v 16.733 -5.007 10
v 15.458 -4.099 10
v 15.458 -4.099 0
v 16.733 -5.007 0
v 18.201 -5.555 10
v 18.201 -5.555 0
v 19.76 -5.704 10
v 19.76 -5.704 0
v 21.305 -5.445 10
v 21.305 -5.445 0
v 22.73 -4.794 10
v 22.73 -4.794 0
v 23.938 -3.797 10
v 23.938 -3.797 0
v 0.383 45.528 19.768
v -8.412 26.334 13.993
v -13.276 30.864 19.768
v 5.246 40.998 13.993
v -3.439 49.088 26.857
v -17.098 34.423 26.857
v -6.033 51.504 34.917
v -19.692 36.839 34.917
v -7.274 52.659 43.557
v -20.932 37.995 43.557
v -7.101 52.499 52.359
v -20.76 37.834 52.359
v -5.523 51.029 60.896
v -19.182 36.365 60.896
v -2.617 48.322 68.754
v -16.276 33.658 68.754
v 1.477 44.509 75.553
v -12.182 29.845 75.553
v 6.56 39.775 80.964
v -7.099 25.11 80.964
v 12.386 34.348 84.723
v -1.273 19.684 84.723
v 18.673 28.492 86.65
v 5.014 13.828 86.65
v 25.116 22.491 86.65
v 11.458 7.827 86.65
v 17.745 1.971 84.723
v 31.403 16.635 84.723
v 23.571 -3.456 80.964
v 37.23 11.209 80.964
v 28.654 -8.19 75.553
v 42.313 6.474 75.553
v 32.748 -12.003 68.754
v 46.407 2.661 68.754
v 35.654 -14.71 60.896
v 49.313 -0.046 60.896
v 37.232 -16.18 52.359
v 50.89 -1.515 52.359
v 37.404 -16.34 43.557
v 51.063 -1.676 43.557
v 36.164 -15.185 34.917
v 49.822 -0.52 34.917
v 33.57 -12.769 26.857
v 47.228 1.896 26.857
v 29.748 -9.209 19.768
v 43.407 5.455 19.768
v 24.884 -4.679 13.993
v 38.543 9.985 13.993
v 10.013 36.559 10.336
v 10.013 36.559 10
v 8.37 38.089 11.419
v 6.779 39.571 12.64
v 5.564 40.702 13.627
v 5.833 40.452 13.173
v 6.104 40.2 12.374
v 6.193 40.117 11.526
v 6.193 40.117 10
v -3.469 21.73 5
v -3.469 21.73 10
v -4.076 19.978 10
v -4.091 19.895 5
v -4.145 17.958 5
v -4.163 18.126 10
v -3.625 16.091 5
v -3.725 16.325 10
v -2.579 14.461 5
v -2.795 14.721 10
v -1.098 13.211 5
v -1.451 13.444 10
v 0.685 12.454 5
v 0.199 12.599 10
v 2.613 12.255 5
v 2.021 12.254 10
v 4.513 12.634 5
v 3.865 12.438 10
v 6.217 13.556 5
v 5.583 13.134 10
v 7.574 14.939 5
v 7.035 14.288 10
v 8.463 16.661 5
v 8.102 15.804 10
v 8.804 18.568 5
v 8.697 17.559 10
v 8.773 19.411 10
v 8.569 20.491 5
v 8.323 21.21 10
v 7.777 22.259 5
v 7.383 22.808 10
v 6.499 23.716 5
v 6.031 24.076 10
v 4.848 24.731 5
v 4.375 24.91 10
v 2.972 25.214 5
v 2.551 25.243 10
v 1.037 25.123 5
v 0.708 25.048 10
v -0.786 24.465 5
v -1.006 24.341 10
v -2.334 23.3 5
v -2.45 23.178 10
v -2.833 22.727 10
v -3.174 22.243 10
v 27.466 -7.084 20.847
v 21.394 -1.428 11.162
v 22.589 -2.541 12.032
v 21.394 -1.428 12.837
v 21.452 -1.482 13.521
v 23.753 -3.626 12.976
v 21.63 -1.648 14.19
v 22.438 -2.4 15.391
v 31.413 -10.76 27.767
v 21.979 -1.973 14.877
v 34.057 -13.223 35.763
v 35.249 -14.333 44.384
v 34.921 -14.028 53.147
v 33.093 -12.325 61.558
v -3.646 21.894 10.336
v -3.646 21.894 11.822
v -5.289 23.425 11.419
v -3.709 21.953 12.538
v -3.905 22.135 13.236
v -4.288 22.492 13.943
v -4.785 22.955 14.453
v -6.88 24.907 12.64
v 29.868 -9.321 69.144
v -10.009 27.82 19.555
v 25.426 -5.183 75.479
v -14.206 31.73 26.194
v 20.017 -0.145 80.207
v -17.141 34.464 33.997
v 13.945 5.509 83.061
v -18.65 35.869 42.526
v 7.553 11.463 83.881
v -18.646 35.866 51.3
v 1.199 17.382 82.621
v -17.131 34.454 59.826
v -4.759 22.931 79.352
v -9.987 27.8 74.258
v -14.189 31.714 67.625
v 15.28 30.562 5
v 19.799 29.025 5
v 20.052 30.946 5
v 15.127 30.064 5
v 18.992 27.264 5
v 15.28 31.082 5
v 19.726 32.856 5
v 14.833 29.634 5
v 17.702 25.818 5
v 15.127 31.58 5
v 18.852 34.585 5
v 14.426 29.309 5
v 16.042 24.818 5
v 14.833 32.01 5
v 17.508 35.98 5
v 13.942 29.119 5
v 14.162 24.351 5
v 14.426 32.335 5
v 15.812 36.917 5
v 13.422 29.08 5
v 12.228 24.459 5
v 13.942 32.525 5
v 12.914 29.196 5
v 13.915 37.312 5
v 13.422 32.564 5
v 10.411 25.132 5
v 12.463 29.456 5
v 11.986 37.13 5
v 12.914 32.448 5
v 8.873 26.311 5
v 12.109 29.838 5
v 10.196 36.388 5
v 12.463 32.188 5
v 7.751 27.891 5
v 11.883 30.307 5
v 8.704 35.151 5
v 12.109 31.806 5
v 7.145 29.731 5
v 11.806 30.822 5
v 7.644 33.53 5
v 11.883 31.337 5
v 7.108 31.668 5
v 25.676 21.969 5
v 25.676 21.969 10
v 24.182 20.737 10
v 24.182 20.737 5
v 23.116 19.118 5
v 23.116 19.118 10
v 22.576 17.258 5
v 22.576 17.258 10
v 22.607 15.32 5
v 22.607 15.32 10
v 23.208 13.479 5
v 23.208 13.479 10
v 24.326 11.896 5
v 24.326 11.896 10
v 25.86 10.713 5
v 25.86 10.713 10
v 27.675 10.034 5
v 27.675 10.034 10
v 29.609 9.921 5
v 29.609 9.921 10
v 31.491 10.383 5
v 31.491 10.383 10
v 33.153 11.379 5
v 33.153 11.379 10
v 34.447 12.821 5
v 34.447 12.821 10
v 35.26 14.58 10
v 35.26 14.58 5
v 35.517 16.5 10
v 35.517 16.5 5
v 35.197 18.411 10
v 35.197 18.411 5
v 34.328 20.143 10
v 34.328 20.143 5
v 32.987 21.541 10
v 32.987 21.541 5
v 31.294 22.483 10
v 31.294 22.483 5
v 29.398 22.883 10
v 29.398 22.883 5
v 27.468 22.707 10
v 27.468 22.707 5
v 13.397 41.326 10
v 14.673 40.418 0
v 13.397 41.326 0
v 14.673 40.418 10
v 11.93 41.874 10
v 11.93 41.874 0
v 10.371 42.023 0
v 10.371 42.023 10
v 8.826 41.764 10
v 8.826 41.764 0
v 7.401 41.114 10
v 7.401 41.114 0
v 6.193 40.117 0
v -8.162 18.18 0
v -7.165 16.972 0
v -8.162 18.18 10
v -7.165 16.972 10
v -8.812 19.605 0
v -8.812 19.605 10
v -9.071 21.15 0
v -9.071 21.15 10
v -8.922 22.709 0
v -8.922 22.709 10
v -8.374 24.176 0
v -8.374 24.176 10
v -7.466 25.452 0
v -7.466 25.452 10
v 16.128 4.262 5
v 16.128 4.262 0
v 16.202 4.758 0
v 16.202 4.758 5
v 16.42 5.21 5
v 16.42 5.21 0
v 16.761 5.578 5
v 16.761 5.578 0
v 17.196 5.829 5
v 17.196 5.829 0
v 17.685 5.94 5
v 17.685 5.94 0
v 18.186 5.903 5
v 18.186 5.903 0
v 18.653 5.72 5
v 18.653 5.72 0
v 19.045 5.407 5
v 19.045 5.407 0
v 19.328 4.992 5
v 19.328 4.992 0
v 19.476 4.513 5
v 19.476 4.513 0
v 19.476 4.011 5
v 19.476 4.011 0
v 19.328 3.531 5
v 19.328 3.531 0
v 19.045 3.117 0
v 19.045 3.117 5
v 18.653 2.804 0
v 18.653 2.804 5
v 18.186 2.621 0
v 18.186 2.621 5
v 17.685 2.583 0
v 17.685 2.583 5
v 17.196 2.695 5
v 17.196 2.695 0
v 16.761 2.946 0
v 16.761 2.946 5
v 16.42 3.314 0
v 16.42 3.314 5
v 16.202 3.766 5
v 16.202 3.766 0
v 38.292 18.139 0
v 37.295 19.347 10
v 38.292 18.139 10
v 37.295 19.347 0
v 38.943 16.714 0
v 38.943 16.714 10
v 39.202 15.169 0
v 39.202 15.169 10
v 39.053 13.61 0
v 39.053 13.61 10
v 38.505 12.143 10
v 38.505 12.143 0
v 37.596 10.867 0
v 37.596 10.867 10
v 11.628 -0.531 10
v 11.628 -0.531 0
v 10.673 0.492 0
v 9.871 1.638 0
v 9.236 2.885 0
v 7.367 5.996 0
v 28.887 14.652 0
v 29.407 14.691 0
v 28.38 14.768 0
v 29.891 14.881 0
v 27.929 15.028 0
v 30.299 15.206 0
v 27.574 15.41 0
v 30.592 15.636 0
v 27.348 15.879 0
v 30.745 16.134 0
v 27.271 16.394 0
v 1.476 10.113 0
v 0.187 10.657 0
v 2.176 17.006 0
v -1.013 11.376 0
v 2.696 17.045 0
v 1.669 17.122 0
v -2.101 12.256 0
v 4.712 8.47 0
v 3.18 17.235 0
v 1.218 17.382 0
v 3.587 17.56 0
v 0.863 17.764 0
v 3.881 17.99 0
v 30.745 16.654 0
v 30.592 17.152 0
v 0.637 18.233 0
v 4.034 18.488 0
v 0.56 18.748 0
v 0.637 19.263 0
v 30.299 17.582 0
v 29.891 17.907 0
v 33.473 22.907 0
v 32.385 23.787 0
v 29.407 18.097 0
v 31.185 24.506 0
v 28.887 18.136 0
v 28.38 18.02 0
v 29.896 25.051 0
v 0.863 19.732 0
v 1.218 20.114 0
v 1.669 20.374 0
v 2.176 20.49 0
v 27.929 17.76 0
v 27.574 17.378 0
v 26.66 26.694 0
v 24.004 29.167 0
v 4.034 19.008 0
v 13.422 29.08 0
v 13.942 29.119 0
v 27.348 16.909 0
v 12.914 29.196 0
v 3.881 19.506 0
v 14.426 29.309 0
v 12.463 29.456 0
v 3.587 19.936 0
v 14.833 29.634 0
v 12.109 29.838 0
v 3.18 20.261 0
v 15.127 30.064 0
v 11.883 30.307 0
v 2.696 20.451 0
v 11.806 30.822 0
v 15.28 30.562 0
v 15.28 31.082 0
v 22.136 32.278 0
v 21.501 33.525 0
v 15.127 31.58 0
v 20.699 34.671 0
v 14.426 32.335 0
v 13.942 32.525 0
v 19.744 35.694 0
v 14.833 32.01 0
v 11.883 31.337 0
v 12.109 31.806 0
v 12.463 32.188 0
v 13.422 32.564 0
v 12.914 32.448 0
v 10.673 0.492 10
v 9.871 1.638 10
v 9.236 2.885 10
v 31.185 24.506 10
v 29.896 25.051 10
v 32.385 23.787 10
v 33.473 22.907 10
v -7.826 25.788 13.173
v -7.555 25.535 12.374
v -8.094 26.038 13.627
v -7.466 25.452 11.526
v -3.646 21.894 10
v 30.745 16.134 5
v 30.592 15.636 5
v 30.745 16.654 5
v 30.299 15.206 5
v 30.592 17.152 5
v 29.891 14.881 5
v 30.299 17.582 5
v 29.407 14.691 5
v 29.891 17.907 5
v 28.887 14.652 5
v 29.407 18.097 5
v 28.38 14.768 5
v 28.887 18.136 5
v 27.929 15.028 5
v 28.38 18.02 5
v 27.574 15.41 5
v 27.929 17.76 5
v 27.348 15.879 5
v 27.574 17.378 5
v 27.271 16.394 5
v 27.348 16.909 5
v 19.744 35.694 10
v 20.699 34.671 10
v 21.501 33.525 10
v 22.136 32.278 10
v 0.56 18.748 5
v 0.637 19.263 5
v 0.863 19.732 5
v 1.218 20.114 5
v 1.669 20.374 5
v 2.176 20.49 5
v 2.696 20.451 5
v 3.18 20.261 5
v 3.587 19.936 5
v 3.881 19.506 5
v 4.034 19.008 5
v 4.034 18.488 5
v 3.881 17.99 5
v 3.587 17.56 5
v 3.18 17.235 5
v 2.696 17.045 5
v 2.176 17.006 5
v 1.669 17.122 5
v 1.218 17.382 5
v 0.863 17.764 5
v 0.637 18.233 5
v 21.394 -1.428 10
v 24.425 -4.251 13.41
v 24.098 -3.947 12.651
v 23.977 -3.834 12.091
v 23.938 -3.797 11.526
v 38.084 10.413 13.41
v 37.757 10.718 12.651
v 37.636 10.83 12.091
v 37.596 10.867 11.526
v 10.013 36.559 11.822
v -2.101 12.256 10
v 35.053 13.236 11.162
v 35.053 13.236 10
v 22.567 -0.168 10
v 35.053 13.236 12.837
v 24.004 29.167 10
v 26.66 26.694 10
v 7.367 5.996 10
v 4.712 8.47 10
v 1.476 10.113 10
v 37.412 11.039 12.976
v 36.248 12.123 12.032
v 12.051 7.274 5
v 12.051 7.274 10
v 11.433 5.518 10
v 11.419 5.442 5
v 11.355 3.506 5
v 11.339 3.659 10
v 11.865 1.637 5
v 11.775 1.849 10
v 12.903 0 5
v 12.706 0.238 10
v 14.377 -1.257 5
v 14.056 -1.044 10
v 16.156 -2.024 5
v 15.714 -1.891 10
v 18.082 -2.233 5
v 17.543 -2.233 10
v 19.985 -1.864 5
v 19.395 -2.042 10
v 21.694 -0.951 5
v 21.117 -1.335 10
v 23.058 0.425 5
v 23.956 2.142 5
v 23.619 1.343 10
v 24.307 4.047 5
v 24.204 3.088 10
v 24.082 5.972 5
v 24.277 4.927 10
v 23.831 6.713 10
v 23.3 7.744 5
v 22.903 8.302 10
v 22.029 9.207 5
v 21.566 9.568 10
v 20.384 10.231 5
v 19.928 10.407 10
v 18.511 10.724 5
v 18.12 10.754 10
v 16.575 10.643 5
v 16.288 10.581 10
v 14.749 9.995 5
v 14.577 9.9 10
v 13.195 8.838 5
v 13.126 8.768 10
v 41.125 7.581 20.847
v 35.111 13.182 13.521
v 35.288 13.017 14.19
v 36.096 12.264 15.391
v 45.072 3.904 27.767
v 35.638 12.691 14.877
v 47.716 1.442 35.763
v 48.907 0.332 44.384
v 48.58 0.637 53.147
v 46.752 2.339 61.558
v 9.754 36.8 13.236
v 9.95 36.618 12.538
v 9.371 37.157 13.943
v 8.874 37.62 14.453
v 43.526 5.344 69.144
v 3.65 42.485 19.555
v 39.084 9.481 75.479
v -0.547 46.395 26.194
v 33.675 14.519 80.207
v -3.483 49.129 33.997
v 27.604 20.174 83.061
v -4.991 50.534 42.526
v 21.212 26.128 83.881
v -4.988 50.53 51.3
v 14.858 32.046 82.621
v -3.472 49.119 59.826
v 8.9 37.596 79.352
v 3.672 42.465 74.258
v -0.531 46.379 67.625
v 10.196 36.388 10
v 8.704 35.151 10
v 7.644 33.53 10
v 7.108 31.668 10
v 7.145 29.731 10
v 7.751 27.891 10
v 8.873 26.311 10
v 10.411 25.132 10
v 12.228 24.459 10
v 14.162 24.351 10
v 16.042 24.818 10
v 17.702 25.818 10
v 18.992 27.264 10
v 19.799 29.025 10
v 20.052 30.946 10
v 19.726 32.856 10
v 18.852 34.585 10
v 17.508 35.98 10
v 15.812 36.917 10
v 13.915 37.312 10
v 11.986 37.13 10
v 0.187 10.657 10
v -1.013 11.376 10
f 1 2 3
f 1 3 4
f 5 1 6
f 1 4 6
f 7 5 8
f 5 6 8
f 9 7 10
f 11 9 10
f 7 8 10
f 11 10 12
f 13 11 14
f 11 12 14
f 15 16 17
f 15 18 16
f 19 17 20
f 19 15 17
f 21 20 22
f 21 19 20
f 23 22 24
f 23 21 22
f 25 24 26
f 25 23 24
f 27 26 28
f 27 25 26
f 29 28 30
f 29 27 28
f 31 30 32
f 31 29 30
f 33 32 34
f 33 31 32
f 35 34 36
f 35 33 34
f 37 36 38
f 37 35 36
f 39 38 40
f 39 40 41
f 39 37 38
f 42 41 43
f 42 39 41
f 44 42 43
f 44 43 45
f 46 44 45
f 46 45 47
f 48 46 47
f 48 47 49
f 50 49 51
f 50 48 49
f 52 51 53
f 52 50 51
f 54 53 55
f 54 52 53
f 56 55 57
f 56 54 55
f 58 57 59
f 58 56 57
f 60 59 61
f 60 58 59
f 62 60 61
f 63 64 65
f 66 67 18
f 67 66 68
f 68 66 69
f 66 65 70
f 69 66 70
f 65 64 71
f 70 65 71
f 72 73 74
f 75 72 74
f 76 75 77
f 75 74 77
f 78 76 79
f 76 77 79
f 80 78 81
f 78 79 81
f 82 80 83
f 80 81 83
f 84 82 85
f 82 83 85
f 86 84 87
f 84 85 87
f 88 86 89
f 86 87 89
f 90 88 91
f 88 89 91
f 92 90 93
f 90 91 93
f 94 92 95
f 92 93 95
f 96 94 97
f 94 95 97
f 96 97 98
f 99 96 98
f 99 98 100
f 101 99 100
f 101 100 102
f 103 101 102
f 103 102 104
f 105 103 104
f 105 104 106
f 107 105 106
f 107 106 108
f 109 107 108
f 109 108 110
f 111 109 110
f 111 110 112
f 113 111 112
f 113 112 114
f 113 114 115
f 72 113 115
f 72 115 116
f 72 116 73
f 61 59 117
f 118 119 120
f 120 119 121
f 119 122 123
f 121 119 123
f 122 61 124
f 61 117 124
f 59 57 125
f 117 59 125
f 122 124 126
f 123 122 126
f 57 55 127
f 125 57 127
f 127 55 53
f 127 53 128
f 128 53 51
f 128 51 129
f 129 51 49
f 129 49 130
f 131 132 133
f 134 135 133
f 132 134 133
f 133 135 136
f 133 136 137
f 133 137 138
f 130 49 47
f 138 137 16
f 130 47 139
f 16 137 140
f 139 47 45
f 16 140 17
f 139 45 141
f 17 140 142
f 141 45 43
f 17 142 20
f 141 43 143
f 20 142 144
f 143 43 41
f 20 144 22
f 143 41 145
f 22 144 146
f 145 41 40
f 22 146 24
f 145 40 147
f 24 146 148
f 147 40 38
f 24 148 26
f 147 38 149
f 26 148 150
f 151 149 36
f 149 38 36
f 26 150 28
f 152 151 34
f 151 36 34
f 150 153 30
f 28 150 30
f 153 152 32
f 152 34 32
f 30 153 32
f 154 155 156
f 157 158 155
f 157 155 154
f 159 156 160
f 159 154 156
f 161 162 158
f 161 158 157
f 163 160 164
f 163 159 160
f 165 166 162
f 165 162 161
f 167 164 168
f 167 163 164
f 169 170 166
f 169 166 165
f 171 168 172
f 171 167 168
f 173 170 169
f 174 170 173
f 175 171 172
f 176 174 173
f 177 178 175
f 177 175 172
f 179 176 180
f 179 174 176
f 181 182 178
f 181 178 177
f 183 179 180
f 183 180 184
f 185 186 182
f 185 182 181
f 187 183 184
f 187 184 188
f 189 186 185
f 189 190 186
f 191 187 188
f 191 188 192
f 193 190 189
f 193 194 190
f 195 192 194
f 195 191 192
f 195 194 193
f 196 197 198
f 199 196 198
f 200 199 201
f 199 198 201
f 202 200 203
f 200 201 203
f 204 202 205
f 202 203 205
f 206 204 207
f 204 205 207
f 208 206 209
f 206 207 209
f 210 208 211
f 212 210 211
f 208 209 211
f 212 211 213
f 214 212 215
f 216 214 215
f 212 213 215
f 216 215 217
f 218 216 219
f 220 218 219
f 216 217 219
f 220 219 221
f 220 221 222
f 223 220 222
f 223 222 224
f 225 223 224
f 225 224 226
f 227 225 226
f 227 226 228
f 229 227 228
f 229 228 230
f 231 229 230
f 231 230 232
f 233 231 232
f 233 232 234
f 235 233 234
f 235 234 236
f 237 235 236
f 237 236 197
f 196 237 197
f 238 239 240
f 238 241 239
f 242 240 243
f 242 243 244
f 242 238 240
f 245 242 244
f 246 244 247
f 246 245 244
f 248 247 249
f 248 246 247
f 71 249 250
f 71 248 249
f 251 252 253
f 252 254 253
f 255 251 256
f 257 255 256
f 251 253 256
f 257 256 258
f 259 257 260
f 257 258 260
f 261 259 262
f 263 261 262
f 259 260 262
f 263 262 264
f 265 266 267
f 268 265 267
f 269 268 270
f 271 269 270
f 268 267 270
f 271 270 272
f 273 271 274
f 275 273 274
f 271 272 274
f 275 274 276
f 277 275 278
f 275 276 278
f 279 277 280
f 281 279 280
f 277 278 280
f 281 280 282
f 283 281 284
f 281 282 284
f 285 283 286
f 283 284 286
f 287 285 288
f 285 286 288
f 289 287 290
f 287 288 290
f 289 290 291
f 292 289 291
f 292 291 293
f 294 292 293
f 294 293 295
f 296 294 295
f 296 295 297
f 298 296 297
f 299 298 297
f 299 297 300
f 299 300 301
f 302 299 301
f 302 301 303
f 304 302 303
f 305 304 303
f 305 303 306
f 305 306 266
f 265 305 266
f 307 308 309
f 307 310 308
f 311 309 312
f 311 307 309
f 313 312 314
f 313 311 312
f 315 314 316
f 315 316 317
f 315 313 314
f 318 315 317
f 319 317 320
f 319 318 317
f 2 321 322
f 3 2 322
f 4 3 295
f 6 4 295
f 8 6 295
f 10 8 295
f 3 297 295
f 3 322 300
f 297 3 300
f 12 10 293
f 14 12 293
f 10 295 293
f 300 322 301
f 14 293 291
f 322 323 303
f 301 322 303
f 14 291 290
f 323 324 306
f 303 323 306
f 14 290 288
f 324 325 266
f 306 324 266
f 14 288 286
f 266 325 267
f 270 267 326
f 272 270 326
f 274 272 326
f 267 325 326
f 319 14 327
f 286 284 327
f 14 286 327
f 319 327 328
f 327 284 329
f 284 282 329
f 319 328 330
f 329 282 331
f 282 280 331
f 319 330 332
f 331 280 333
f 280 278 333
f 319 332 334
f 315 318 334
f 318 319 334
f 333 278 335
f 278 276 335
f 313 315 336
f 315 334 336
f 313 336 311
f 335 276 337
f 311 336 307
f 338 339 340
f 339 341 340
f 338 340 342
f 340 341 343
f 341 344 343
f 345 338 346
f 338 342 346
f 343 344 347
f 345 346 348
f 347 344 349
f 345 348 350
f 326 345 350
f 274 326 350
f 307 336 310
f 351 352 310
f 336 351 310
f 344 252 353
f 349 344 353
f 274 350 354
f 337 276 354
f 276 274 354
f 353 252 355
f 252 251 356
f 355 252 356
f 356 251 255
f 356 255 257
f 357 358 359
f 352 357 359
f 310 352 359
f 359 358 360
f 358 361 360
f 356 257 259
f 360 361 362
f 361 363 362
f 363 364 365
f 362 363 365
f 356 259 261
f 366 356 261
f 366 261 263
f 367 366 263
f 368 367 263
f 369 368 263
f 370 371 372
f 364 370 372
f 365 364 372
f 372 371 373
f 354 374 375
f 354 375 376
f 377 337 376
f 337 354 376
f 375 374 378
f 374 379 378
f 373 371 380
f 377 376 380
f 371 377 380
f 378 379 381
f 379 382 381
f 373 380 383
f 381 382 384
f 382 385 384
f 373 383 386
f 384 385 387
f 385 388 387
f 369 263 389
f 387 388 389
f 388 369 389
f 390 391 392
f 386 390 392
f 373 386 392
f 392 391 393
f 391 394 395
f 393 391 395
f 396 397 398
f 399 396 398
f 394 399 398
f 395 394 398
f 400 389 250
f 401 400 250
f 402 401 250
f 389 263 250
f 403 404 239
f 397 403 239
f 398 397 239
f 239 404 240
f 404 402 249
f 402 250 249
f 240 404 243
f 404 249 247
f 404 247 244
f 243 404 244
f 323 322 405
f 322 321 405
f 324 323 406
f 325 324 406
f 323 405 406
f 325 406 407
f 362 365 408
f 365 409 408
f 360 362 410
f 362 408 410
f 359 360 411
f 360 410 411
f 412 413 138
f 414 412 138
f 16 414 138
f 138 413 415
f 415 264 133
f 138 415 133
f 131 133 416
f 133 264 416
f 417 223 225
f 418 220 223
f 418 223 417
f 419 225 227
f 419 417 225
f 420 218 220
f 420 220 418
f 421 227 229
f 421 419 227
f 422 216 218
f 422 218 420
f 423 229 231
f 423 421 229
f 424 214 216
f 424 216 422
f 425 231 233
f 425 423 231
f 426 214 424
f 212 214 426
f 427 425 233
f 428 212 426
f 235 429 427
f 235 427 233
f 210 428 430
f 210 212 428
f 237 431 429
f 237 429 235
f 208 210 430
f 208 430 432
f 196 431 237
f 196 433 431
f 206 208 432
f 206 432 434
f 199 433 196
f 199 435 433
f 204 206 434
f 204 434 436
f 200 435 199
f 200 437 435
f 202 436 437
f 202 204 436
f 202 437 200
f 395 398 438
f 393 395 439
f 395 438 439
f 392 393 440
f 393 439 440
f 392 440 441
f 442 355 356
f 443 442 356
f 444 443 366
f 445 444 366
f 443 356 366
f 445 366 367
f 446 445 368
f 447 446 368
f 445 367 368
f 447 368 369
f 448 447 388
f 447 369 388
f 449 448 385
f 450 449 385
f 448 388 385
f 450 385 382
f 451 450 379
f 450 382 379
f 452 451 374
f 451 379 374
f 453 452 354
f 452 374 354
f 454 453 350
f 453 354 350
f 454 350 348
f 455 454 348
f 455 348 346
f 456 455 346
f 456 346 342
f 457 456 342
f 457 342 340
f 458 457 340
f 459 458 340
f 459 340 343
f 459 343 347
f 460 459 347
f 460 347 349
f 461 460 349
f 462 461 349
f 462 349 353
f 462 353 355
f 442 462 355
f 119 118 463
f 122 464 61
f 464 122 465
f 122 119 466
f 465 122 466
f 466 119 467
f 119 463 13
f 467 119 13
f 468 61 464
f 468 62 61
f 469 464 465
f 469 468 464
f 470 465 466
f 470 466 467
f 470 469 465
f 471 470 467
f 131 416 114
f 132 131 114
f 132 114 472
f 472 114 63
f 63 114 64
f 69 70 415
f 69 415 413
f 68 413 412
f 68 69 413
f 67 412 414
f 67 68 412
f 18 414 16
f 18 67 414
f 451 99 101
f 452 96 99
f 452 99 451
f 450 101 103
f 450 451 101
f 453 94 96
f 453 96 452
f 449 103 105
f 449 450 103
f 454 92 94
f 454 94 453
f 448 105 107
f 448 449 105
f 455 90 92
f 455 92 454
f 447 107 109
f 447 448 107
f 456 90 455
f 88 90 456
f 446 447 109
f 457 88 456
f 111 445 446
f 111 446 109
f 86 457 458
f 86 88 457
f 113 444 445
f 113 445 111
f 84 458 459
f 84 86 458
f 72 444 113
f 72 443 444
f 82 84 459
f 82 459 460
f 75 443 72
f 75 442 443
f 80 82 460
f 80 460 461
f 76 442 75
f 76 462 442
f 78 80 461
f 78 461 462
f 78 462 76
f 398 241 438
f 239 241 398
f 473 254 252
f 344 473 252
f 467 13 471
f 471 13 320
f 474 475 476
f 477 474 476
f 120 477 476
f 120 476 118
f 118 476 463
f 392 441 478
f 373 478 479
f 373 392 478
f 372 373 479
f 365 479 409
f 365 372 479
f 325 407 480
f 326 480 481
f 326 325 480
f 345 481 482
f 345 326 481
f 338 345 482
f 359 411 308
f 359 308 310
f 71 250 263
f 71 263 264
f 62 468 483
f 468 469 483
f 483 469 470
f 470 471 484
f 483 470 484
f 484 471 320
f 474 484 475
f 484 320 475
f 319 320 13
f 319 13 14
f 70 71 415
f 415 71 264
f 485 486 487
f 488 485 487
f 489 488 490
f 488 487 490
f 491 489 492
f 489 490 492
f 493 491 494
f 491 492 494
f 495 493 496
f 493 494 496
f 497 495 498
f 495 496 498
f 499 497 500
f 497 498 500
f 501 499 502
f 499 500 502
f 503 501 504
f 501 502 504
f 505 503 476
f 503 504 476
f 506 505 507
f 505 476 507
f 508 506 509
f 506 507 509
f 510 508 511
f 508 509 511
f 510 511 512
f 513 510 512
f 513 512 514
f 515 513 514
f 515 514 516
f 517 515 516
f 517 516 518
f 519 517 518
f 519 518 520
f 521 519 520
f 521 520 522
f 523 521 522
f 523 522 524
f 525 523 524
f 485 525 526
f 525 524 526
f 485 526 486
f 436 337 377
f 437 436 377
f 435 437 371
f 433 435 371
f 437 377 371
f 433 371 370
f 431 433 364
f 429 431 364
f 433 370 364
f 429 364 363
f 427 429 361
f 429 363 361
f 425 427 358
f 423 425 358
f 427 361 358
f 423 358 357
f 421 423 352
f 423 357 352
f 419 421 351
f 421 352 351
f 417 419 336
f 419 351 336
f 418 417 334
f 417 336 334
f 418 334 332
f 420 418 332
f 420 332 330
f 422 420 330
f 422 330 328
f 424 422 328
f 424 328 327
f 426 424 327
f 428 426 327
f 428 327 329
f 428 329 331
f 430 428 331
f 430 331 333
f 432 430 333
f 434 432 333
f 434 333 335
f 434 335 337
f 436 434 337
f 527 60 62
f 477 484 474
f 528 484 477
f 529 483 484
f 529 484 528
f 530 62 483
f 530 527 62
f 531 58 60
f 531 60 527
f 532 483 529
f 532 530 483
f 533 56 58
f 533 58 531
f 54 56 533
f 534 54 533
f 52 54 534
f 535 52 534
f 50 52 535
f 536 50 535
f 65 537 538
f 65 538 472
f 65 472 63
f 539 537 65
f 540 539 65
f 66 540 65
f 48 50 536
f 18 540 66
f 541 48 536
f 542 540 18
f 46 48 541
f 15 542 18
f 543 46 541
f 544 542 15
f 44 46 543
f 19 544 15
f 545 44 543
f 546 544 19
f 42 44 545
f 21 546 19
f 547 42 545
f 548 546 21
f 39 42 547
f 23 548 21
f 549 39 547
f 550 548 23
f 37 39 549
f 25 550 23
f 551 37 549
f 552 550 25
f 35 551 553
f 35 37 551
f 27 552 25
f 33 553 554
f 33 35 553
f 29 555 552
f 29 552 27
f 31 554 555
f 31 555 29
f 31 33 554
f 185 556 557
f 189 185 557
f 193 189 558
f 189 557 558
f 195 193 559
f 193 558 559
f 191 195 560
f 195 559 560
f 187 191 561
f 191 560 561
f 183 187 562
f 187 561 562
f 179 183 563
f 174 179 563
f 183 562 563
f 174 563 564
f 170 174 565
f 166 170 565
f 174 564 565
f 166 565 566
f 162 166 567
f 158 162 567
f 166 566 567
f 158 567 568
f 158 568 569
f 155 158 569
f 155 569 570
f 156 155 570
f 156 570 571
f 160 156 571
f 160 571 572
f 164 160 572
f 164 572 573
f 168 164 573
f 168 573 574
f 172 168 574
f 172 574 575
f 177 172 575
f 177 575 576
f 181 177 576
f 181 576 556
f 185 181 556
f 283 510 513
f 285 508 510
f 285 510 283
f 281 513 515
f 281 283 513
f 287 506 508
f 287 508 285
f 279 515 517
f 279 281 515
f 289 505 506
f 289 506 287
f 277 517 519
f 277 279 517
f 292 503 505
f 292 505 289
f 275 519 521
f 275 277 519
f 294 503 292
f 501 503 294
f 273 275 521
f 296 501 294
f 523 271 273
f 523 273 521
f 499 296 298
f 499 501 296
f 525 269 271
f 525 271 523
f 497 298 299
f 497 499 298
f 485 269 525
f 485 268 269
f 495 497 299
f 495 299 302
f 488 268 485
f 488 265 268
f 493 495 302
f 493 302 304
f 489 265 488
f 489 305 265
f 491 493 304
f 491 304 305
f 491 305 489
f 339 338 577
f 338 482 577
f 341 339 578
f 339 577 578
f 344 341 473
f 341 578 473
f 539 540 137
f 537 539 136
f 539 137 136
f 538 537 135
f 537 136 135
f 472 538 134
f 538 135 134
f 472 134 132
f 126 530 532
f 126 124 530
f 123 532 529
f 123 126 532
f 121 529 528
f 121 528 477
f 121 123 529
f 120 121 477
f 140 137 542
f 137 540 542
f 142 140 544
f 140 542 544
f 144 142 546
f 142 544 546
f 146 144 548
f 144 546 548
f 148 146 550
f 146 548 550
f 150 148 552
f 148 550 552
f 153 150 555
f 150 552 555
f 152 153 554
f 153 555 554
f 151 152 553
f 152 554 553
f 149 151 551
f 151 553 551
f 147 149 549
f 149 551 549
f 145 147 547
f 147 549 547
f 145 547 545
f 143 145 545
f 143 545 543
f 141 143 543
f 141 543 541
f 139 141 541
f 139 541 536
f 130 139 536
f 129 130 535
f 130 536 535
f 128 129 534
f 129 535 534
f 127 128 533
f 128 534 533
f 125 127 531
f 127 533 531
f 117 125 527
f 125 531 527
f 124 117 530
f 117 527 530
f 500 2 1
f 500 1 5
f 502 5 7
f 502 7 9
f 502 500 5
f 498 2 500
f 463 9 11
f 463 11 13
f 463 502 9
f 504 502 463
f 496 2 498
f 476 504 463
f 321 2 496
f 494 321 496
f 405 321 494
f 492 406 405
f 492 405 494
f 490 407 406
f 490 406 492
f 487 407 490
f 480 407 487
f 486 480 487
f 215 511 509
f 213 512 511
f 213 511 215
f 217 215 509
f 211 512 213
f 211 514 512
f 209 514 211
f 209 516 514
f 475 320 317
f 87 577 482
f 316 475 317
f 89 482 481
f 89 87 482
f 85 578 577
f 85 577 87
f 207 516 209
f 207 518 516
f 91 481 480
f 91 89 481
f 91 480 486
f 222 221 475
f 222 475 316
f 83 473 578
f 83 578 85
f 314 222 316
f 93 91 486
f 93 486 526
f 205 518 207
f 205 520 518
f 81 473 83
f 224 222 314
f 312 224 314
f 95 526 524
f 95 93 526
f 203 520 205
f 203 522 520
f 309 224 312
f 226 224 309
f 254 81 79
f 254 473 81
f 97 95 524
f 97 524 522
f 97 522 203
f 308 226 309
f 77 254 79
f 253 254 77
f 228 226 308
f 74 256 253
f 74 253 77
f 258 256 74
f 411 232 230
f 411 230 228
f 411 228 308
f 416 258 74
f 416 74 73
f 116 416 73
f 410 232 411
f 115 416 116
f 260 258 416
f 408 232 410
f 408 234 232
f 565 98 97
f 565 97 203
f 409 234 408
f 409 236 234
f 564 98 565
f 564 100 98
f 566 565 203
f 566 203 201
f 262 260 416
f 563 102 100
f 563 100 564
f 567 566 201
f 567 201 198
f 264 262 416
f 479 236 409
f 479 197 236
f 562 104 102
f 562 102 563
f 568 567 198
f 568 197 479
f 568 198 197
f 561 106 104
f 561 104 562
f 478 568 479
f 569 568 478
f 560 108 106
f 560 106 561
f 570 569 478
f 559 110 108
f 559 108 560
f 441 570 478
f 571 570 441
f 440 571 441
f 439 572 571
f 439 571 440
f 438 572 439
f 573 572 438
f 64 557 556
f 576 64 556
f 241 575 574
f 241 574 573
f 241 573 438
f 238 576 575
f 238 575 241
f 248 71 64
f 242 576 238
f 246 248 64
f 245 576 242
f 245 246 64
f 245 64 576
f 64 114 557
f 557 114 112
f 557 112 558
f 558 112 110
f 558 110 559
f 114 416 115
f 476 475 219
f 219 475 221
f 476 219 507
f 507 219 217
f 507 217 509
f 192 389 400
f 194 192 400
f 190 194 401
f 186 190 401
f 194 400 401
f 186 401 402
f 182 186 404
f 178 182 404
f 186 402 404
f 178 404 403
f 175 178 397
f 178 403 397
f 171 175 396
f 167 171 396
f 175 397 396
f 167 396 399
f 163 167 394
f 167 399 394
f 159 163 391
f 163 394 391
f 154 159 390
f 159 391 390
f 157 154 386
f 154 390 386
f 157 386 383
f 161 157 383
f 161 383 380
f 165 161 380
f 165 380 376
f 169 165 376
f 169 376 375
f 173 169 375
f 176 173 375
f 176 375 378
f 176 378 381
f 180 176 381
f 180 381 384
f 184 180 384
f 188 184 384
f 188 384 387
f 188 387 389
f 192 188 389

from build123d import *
from build123d.topology import SkipClean

# Parameters (mm, degrees)
BOSS_EXTRUDE2_DEPTH            = 10
SKETCH3_R                      = 40
SKETCH3_R_2                    = 37
BOSS_EXTRUDE3_DEPTH            = 20.040152
CUT_EXTRUDE1_REACH             = 115.803
CUT_EXTRUDE1_END_RADIUS        = 37
SKETCH5_R                      = 1.74703634
SKETCH5_R_2                    = 1.683355043
SKETCH10_W                     = 30.914979244
SKETCH10_H                     = 10
BOSS_EXTRUDE8_DEPTH            = 6
SKETCH11_W                     = 30.914979244
SKETCH11_H                     = 10
BOSS_EXTRUDE9_DEPTH            = 6
SKETCH12_W                     = 10
SKETCH12_H                     = 32.040152213
BOSS_EXTRUDE10_DEPTH           = 6
SKETCH13_W                     = 10
SKETCH13_H                     = 32.040152213
BOSS_EXTRUDE11_DEPTH           = 6
FILLET3_R                      = 6
BOSS_EXTRUDE12_REACH           = 108.364
BOSS_EXTRUDE13_REACH           = 108.364
SKETCH17_R                     = 6.5
CUT_EXTRUDE3_DEPTH             = 5
CUT_EXTRUDE3_DIRECTION_2_REACH = 108.364
CUT_EXTRUDE4_REACH             = 108.364
CUT_EXTRUDE4_END_RADIUS        = 37
FILLET4_R                      = 3
CUT_EXTRUDE5_REACH             = 115.803
FILLET5_R                      = 10


with BuildPart() as part:
    # Sketch1 → Boss-Extrude2 (new body)
    with BuildSketch(Plane.XY):
        Polygon((-3.075119388, 21.362598398), (19.547102475, 0.291978577), (33.205802521, 14.956480402), (10.583580658, 36.027100222), align=None)
    extrude(amount=BOSS_EXTRUDE2_DEPTH)

    # Sketch3 → Boss-Extrude3 (add)
    with BuildSketch(Plane(origin=(22.884598517, 24.569778644, 0), x_dir=(-0.7317560100777086, 0.6815666817818727, 0), z_dir=(0.6815666817818727, 0.7317560100777086, 0))):
        with Locations((1.352782776, 46.892628188)):
            Circle(SKETCH3_R)
        with Locations((1.352782776, 46.892628188)):
            Circle(SKETCH3_R_2, mode=Mode.SUBTRACT)
    extrude(amount=-BOSS_EXTRUDE3_DEPTH)

    # Cut-Extrude1: up to this cylinder (the profile starts outside it)
    cut_extrude1_end = Plane(origin=(15.043707154, 18.136311869, 46.892628188), z_dir=(0.6815666817818727, 0.7317560100777086, 0)) * Cylinder(CUT_EXTRUDE1_END_RADIUS, 323.139339437, mode=Mode.PRIVATE)
    # Sketch5 → Cut-Extrude1 (cut, up to the surface)
    with BuildSketch(Plane(origin=(0, 0, 0), x_dir=(-1, 0, 0), z_dir=(0, 0, -1)), mode=Mode.PRIVATE) as cut_extrude1_sk1:
        with Locations((-13.552748015, 30.82203985)):
            Circle(SKETCH5_R)
    cut_extrude1_tool1 = extrude(cut_extrude1_sk1.sketch, amount=-CUT_EXTRUDE1_REACH, mode=Mode.PRIVATE) - cut_extrude1_end
    add(cut_extrude1_tool1.solids().sort_by_distance((13.552748, 30.82204, 0))[0], mode=Mode.SUBTRACT)
    # Sketch5 → Cut-Extrude1 (cut, up to the surface)
    with BuildSketch(Plane(origin=(0, 0, 0), x_dir=(-1, 0, 0), z_dir=(0, 0, -1)), mode=Mode.PRIVATE) as cut_extrude1_sk2:
        with Locations((-2.306822594, 18.748043967)):
            Circle(SKETCH5_R)
    cut_extrude1_tool2 = extrude(cut_extrude1_sk2.sketch, amount=-CUT_EXTRUDE1_REACH, mode=Mode.PRIVATE) - cut_extrude1_end
    add(cut_extrude1_tool2.solids().sort_by_distance((2.306823, 18.748044, 0))[0], mode=Mode.SUBTRACT)
    # Sketch5 → Cut-Extrude1 (cut, up to the surface)
    with BuildSketch(Plane(origin=(0, 0, 0), x_dir=(-1, 0, 0), z_dir=(0, 0, -1)), mode=Mode.PRIVATE) as cut_extrude1_sk3:
        with Locations((-17.810962495, 4.261826269)):
            Circle(SKETCH5_R_2)
    cut_extrude1_tool3 = extrude(cut_extrude1_sk3.sketch, amount=-CUT_EXTRUDE1_REACH, mode=Mode.PRIVATE) - cut_extrude1_end
    add(cut_extrude1_tool3.solids().sort_by_distance((17.810962, 4.261826, 0))[0], mode=Mode.SUBTRACT)
    # Sketch5 → Cut-Extrude1 (cut, up to the surface)
    with BuildSketch(Plane(origin=(0, 0, 0), x_dir=(-1, 0, 0), z_dir=(0, 0, -1)), mode=Mode.PRIVATE) as cut_extrude1_sk4:
        with Locations((-29.017899523, 16.394033311)):
            Circle(SKETCH5_R)
    cut_extrude1_tool4 = extrude(cut_extrude1_sk4.sketch, amount=-CUT_EXTRUDE1_REACH, mode=Mode.PRIVATE) - cut_extrude1_end
    add(cut_extrude1_tool4.solids().sort_by_distance((29.0179, 16.394033, 0))[0], mode=Mode.SUBTRACT)

    # Sketch10 → Boss-Extrude8 (add)
    with BuildSketch(Plane(origin=(9.22589847, 9.905276819, 0), x_dir=(0.7317560100777085, -0.6815666817818729, 0), z_dir=(-0.6815666817818729, -0.7317560100777085, 0))):
        with Locations((-1.352782776, 5)):
            Rectangle(SKETCH10_W, SKETCH10_H)
    extrude(amount=BOSS_EXTRUDE8_DEPTH)

    # Sketch11 → Boss-Extrude9 (add)
    with BuildSketch(Plane(origin=(22.884598517, 24.569778644, 0), x_dir=(0.7317560100777083, -0.681566681781873, 0), z_dir=(0.681566681781873, 0.7317560100777083, 0))):
        with Locations((-1.352782776, -5)):
            Rectangle(SKETCH11_W, SKETCH11_H)
    extrude(amount=BOSS_EXTRUDE9_DEPTH)

    # Sketch12 → Boss-Extrude10 (add)
    with BuildSketch(Plane(origin=(-12.301017858, 11.457321578, 0), x_dir=(0, 0, 1), z_dir=(-0.7317560100777086, 0.6815666817818726, 0))):
        with Locations((5, 23.556386958)):
            Rectangle(SKETCH12_W, SKETCH12_H)
    extrude(amount=BOSS_EXTRUDE10_DEPTH)

    # Sketch13 → Boss-Extrude11 (add)
    with BuildSketch(Plane(origin=(10.321204005, -9.613298242, 0), x_dir=(0, 0, -1), z_dir=(0.7317560100777092, -0.6815666817818721, 0))):
        with Locations((-5, 23.556386958)):
            Rectangle(SKETCH13_W, SKETCH13_H)
    extrude(amount=BOSS_EXTRUDE11_DEPTH)

    # Fillet3
    fillet3_edges = [part.edges().sort_by_distance(p)[0] for p in [
        (10.282444688, 44.507036374, 5),
        (-11.555055539, 21.061462428, 5),
        (41.685738672, 15.257616372, 5),
        (19.848238445, -8.187957574, 5),
    ]]
    fillet(fillet3_edges, radius=FILLET3_R)

    # Sketch15 → Boss-Extrude12 (add, up to next)
    with BuildSketch(Plane.XY.offset(10), mode=Mode.PRIVATE) as boss_extrude12_sk1:
        Polygon((19.547102475, 0.291978577), (23.937638536, -3.797421514), (37.596338582, 10.867080311), (33.205802521, 14.956480402), align=None)
    boss_extrude12_tool1 = extrude(boss_extrude12_sk1.sketch, amount=BOSS_EXTRUDE12_REACH, mode=Mode.PRIVATE) - part.part
    add(boss_extrude12_tool1.solids().sort_by_distance((28.571721, 5.579529, 10))[0])

    # Sketch16 → Boss-Extrude13 (add, up to next)
    with BuildSketch(Plane.XY.offset(10), mode=Mode.PRIVATE) as boss_extrude13_sk1:
        Polygon((10.583580658, 36.027100222), (6.193044598, 40.116500313), (-7.465655449, 25.451998488), (-3.075119388, 21.362598398), align=None)
    boss_extrude13_tool1 = extrude(boss_extrude13_sk1.sketch, amount=BOSS_EXTRUDE13_REACH, mode=Mode.PRIVATE) - part.part
    add(boss_extrude13_tool1.solids().sort_by_distance((1.558963, 30.739549, 10))[0])

    # Sketch17 → Cut-Extrude3 (cut)
    with BuildSketch(Plane.XY.offset(10)):
        with Locations(Location((2.306822594, 18.748043967, 0), (0, 0, 152.697494073))):
            Circle(SKETCH17_R)
        with Locations(Location((13.552748015, 30.82203985, 0), (0, 0, 121.093351503))):
            Circle(SKETCH17_R)
        with Locations(Location((17.810962495, 4.261826269, 0), (0, 0, 152.393126662))):
            Circle(SKETCH17_R)
        with Locations(Location((29.017899523, 16.394033311, 0), (0, 0, 120.935167822))):
            Circle(SKETCH17_R)
    extrude(amount=-CUT_EXTRUDE3_DEPTH, mode=Mode.SUBTRACT)

    # Sketch17 → Cut-Extrude3 direction 2 (cut, up to next)
    with BuildSketch(Plane.XY.offset(10), mode=Mode.PRIVATE) as cut_extrude3_direction_2_sk1:
        with Locations(Location((2.306822594, 18.748043967, 0), (0, 0, 152.697494073))):
            Circle(SKETCH17_R)
    cut_extrude3_direction_2_tool1 = extrude(cut_extrude3_direction_2_sk1.sketch, amount=CUT_EXTRUDE3_DIRECTION_2_REACH, mode=Mode.PRIVATE) & part.part
    # Sketch17 → Cut-Extrude3 direction 2 (cut, up to next)
    with BuildSketch(Plane.XY.offset(10), mode=Mode.PRIVATE) as cut_extrude3_direction_2_sk2:
        with Locations(Location((13.552748015, 30.82203985, 0), (0, 0, 121.093351503))):
            Circle(SKETCH17_R)
    cut_extrude3_direction_2_tool2 = extrude(cut_extrude3_direction_2_sk2.sketch, amount=CUT_EXTRUDE3_DIRECTION_2_REACH, mode=Mode.PRIVATE) & part.part
    # Sketch17 → Cut-Extrude3 direction 2 (cut, up to next)
    with BuildSketch(Plane.XY.offset(10), mode=Mode.PRIVATE) as cut_extrude3_direction_2_sk3:
        with Locations(Location((17.810962495, 4.261826269, 0), (0, 0, 152.393126662))):
            Circle(SKETCH17_R)
    cut_extrude3_direction_2_tool3 = extrude(cut_extrude3_direction_2_sk3.sketch, amount=CUT_EXTRUDE3_DIRECTION_2_REACH, mode=Mode.PRIVATE) & part.part
    # Sketch17 → Cut-Extrude3 direction 2 (cut, up to next)
    with BuildSketch(Plane.XY.offset(10), mode=Mode.PRIVATE) as cut_extrude3_direction_2_sk4:
        with Locations(Location((29.017899523, 16.394033311, 0), (0, 0, 120.935167822))):
            Circle(SKETCH17_R)
    cut_extrude3_direction_2_tool4 = extrude(cut_extrude3_direction_2_sk4.sketch, amount=CUT_EXTRUDE3_DIRECTION_2_REACH, mode=Mode.PRIVATE) & part.part
    add(cut_extrude3_direction_2_tool1.solids().sort_by_distance((2.306823, 18.748044, 10))[0], mode=Mode.SUBTRACT)
    add(cut_extrude3_direction_2_tool2.solids().sort_by_distance((13.552748, 30.82204, 10))[0], mode=Mode.SUBTRACT)
    add(cut_extrude3_direction_2_tool3.solids().sort_by_distance((17.810962, 4.261826, 10))[0], mode=Mode.SUBTRACT)
    add(cut_extrude3_direction_2_tool4.solids().sort_by_distance((29.0179, 16.394033, 10))[0], mode=Mode.SUBTRACT)

    # Cut-Extrude4: up to this cylinder (the profile starts outside it)
    with SkipClean():  # the faces are left unmerged after this step: merging them gives an invalid solid
        cut_extrude4_end = Plane(origin=(15.133329832, 18.232534198, 46.892628188), z_dir=(0.6815666817818727, 0.7317560100777086, 0)) * Cylinder(CUT_EXTRUDE4_END_RADIUS, 291.728, mode=Mode.PRIVATE)
        # Sketch18 → Cut-Extrude4 (cut, up to the surface)
        with BuildSketch(Plane.XY.offset(10), mode=Mode.PRIVATE) as cut_extrude4_sk1:
            Polygon((21.393947235, -1.428195685), (-3.645697664, 21.894042126), (10.148979711, 36.704534402), (35.18862461, 13.382296591), align=None)
        cut_extrude4_tool1 = extrude(cut_extrude4_sk1.sketch, amount=CUT_EXTRUDE4_REACH, mode=Mode.PRIVATE) - cut_extrude4_end
        add(cut_extrude4_tool1.solids().sort_by_distance((15.771463, 17.638169, 10))[0], mode=Mode.SUBTRACT)
        add(cut_extrude4_tool1.solids().sort_by_distance((15.771463, 17.638169, 10))[1], mode=Mode.SUBTRACT)
    add(part.part.scale(1), mode=Mode.REPLACE)  # the faces are merged on a copy

    # Fillet4
    fillet4_edges = [part.edges().sort_by_distance(p)[0] for p in [
        (30.766988562, 3.534829402, 13.135019577),
        (-0.636305422, 32.784249404, 13.135019577),
        (3.18365236, 29.226293038, 13.645787353),
        (28.223297258, 5.904055227, 14.555786818),
    ]]
    fillet(fillet4_edges, radius=FILLET4_R)

    # Sketch19 → Cut-Extrude5 (cut, up to next)
    with BuildSketch(Plane(origin=(0, 0, 0), x_dir=(-1, 0, 0), z_dir=(0, 0, -1)), mode=Mode.PRIVATE) as cut_extrude5_sk1:
        with BuildLine():
            Line((-31.678269443, 24.578698129), (-21.538760737, 34.022763101))
            ThreePointArc((-21.538760737, 34.022763101), (-25.245381726, 27.837218595), (-31.678269443, 24.578698129))
        make_face()
    cut_extrude5_tool1 = extrude(cut_extrude5_sk1.sketch, amount=-CUT_EXTRUDE5_REACH, mode=Mode.PRIVATE) & part.part
    # Sketch19 → Cut-Extrude5 (cut, up to next)
    with BuildSketch(Plane(origin=(0, 0, 0), x_dir=(-1, 0, 0), z_dir=(0, 0, -1)), mode=Mode.PRIVATE) as cut_extrude5_sk2:
        with BuildLine():
            Line((0.30653048, 10.58444578), (-9.832978226, 1.140380807))
            ThreePointArc((-9.832978226, 1.140380807), (-6.126357236, 7.325925314), (0.30653048, 10.58444578))
        make_face()
    cut_extrude5_tool2 = extrude(cut_extrude5_sk2.sketch, amount=-CUT_EXTRUDE5_REACH, mode=Mode.PRIVATE) & part.part
    add(cut_extrude5_tool1.solids().sort_by_distance((26.059499, 28.711286, 0))[0], mode=Mode.SUBTRACT)
    add(cut_extrude5_tool2.solids().sort_by_distance((5.31224, 6.451858, 0))[0], mode=Mode.SUBTRACT)

    # Fillet5
    fillet5_edges = [part.edges().sort_by_distance(p)[0] for p in [
        (21.538760737, 34.022763101, 5),
        (31.678269443, 24.578698129, 5),
        (9.832978226, 1.140380807, 5),
        (-0.30653048, 10.58444578, 5),
    ]]
    fillet(fillet5_edges, radius=FILLET5_R)


solid = part.part
